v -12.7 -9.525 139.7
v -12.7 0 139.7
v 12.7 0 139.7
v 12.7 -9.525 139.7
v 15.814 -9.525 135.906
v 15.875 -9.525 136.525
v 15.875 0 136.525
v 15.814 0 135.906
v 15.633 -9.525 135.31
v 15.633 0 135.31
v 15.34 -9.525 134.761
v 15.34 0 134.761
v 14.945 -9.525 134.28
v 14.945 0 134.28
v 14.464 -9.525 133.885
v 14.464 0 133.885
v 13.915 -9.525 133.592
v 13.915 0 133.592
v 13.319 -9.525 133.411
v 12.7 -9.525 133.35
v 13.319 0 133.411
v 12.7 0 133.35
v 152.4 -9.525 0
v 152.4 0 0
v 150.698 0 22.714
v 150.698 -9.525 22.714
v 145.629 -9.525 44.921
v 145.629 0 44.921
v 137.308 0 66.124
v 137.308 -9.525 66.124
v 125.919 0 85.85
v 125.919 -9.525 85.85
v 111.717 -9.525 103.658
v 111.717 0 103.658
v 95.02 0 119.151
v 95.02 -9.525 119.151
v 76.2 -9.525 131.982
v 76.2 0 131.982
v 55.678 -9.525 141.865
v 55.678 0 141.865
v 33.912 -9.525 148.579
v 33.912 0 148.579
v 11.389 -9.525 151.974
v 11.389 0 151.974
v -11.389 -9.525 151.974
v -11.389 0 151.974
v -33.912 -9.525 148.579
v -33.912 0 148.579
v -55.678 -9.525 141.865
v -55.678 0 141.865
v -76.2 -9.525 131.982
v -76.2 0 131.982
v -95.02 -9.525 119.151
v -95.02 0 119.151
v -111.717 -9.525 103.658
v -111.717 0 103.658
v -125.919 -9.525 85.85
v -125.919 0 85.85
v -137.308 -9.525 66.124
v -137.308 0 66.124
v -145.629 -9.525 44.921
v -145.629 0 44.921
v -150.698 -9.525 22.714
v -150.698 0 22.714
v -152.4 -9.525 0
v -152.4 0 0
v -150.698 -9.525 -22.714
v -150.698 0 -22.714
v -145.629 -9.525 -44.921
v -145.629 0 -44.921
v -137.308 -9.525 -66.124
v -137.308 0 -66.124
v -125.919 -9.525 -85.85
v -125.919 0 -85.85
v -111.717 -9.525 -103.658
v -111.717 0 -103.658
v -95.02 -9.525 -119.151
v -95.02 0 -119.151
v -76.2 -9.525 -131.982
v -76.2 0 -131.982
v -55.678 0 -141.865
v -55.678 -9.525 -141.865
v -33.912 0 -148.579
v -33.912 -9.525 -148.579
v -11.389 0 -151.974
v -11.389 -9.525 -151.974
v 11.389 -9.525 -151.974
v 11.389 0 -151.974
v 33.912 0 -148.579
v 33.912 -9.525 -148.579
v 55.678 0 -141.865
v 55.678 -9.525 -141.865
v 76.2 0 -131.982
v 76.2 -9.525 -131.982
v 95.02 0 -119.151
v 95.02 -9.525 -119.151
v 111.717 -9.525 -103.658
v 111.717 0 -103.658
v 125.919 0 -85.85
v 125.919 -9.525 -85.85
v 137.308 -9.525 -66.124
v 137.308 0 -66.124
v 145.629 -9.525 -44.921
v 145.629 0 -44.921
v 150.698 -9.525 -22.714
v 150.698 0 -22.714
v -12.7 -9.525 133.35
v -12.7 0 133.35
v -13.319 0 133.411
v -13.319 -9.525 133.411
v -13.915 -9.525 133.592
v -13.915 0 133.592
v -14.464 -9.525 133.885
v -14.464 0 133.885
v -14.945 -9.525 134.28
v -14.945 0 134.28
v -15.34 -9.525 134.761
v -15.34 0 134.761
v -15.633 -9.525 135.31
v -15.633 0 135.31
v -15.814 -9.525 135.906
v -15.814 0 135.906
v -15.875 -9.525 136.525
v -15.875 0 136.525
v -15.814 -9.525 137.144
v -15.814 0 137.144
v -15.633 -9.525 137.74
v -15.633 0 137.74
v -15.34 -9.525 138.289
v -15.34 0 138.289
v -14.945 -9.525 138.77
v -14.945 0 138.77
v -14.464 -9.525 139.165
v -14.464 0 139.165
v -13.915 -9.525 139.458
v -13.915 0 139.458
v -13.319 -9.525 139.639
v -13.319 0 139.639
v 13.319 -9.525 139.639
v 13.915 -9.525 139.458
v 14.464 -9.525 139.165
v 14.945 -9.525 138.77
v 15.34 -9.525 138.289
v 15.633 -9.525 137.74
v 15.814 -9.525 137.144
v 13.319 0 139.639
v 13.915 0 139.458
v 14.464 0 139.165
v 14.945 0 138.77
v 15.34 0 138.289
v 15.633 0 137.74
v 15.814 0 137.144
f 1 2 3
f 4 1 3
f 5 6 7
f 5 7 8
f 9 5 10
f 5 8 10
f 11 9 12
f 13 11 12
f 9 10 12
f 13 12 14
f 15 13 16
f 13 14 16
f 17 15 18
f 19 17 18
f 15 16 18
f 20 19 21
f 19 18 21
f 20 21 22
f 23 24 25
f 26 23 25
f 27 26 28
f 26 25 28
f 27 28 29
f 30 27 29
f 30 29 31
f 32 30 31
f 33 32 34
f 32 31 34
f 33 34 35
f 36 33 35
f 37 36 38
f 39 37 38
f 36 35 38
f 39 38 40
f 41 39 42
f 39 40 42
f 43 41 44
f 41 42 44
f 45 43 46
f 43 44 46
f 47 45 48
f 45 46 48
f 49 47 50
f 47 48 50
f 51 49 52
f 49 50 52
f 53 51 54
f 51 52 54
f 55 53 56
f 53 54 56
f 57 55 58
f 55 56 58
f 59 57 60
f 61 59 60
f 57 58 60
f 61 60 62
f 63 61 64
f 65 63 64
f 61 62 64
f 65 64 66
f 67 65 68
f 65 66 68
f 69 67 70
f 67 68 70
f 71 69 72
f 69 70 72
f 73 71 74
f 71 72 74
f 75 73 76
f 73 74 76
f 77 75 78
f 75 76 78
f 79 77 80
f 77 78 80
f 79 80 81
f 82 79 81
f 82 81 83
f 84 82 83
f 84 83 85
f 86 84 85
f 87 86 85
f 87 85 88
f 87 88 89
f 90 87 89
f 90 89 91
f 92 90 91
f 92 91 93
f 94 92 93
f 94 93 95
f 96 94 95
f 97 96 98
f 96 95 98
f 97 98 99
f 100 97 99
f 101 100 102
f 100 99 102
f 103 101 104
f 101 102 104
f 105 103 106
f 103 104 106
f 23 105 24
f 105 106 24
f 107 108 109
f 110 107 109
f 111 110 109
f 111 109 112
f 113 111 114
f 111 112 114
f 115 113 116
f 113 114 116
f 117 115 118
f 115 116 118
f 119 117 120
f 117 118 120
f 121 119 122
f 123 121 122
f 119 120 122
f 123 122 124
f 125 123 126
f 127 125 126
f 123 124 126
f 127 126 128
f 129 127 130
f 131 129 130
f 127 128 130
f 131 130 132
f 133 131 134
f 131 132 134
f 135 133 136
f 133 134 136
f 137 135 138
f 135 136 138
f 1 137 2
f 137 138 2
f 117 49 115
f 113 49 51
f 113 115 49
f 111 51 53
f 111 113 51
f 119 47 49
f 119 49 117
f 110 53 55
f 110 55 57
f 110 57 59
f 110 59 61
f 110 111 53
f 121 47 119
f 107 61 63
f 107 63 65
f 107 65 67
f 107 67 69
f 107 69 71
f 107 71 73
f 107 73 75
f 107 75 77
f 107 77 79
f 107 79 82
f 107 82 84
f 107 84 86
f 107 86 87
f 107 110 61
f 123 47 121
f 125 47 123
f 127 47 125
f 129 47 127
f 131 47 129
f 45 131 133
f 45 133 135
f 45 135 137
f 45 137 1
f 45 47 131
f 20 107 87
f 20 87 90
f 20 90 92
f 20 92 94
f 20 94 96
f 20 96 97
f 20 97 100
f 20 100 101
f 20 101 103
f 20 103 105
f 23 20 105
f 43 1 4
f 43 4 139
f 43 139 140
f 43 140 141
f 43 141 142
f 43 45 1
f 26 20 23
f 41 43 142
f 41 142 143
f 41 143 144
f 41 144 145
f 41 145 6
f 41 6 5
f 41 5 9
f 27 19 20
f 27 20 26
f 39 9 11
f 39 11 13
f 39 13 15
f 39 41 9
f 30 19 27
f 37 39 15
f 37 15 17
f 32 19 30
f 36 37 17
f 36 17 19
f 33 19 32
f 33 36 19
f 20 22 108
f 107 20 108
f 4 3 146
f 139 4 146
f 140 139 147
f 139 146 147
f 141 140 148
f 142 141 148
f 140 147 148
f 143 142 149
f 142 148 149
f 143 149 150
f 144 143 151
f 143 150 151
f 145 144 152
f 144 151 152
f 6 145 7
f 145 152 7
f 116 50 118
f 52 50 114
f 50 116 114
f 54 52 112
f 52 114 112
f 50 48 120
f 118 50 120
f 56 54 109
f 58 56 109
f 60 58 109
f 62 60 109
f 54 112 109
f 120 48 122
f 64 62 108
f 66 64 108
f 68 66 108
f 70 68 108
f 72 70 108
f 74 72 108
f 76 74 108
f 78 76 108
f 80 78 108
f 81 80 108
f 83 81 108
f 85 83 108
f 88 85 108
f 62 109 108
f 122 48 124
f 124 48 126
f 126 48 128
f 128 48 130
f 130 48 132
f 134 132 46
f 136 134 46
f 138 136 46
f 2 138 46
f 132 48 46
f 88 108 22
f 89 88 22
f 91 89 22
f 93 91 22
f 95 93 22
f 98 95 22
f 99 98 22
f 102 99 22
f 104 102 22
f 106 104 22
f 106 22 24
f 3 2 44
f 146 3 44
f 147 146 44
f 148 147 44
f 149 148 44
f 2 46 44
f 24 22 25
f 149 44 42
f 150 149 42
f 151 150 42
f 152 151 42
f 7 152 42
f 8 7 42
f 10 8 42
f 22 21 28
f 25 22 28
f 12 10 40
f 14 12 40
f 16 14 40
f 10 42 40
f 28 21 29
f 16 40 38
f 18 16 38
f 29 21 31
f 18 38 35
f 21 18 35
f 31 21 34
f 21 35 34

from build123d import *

# Parameters (mm, degrees)
F1_DEPTH = 9.525


# Not quite as in the source:
# - a length typed as a fraction of an inch, garbled in the dataset ("3 / 203.2 mm" for 3/8 in), is restored


with BuildPart() as f1:
    # F0 (on Front) → F1 (new body)
    with BuildSketch(Plane.XZ):
        with BuildLine():
            ThreePointArc((0, 152.4), (-107.7630734528, -107.7630734528), (152.4, 0))
            ThreePointArc((152.4, 0), (107.7630734528, 107.7630734528), (0, 152.4))
        make_face()
        with BuildLine():
            Line((-12.7, 139.7), (0, 139.7))
            Line((0, 139.7), (12.7, 139.7))
            ThreePointArc((12.7, 139.7), (14.9450640303, 138.7700640303), (15.875, 136.525))
            ThreePointArc((15.875, 136.525), (14.9450640303, 134.2799359697), (12.7, 133.35))
            Line((12.7, 133.35), (0, 133.35))
            Line((0, 133.35), (-12.7, 133.35))
            ThreePointArc((-12.7, 133.35), (-15.875, 136.525), (-12.7, 139.7))
        make_face(mode=Mode.SUBTRACT)
    extrude(amount=F1_DEPTH)


solid = f1.part
